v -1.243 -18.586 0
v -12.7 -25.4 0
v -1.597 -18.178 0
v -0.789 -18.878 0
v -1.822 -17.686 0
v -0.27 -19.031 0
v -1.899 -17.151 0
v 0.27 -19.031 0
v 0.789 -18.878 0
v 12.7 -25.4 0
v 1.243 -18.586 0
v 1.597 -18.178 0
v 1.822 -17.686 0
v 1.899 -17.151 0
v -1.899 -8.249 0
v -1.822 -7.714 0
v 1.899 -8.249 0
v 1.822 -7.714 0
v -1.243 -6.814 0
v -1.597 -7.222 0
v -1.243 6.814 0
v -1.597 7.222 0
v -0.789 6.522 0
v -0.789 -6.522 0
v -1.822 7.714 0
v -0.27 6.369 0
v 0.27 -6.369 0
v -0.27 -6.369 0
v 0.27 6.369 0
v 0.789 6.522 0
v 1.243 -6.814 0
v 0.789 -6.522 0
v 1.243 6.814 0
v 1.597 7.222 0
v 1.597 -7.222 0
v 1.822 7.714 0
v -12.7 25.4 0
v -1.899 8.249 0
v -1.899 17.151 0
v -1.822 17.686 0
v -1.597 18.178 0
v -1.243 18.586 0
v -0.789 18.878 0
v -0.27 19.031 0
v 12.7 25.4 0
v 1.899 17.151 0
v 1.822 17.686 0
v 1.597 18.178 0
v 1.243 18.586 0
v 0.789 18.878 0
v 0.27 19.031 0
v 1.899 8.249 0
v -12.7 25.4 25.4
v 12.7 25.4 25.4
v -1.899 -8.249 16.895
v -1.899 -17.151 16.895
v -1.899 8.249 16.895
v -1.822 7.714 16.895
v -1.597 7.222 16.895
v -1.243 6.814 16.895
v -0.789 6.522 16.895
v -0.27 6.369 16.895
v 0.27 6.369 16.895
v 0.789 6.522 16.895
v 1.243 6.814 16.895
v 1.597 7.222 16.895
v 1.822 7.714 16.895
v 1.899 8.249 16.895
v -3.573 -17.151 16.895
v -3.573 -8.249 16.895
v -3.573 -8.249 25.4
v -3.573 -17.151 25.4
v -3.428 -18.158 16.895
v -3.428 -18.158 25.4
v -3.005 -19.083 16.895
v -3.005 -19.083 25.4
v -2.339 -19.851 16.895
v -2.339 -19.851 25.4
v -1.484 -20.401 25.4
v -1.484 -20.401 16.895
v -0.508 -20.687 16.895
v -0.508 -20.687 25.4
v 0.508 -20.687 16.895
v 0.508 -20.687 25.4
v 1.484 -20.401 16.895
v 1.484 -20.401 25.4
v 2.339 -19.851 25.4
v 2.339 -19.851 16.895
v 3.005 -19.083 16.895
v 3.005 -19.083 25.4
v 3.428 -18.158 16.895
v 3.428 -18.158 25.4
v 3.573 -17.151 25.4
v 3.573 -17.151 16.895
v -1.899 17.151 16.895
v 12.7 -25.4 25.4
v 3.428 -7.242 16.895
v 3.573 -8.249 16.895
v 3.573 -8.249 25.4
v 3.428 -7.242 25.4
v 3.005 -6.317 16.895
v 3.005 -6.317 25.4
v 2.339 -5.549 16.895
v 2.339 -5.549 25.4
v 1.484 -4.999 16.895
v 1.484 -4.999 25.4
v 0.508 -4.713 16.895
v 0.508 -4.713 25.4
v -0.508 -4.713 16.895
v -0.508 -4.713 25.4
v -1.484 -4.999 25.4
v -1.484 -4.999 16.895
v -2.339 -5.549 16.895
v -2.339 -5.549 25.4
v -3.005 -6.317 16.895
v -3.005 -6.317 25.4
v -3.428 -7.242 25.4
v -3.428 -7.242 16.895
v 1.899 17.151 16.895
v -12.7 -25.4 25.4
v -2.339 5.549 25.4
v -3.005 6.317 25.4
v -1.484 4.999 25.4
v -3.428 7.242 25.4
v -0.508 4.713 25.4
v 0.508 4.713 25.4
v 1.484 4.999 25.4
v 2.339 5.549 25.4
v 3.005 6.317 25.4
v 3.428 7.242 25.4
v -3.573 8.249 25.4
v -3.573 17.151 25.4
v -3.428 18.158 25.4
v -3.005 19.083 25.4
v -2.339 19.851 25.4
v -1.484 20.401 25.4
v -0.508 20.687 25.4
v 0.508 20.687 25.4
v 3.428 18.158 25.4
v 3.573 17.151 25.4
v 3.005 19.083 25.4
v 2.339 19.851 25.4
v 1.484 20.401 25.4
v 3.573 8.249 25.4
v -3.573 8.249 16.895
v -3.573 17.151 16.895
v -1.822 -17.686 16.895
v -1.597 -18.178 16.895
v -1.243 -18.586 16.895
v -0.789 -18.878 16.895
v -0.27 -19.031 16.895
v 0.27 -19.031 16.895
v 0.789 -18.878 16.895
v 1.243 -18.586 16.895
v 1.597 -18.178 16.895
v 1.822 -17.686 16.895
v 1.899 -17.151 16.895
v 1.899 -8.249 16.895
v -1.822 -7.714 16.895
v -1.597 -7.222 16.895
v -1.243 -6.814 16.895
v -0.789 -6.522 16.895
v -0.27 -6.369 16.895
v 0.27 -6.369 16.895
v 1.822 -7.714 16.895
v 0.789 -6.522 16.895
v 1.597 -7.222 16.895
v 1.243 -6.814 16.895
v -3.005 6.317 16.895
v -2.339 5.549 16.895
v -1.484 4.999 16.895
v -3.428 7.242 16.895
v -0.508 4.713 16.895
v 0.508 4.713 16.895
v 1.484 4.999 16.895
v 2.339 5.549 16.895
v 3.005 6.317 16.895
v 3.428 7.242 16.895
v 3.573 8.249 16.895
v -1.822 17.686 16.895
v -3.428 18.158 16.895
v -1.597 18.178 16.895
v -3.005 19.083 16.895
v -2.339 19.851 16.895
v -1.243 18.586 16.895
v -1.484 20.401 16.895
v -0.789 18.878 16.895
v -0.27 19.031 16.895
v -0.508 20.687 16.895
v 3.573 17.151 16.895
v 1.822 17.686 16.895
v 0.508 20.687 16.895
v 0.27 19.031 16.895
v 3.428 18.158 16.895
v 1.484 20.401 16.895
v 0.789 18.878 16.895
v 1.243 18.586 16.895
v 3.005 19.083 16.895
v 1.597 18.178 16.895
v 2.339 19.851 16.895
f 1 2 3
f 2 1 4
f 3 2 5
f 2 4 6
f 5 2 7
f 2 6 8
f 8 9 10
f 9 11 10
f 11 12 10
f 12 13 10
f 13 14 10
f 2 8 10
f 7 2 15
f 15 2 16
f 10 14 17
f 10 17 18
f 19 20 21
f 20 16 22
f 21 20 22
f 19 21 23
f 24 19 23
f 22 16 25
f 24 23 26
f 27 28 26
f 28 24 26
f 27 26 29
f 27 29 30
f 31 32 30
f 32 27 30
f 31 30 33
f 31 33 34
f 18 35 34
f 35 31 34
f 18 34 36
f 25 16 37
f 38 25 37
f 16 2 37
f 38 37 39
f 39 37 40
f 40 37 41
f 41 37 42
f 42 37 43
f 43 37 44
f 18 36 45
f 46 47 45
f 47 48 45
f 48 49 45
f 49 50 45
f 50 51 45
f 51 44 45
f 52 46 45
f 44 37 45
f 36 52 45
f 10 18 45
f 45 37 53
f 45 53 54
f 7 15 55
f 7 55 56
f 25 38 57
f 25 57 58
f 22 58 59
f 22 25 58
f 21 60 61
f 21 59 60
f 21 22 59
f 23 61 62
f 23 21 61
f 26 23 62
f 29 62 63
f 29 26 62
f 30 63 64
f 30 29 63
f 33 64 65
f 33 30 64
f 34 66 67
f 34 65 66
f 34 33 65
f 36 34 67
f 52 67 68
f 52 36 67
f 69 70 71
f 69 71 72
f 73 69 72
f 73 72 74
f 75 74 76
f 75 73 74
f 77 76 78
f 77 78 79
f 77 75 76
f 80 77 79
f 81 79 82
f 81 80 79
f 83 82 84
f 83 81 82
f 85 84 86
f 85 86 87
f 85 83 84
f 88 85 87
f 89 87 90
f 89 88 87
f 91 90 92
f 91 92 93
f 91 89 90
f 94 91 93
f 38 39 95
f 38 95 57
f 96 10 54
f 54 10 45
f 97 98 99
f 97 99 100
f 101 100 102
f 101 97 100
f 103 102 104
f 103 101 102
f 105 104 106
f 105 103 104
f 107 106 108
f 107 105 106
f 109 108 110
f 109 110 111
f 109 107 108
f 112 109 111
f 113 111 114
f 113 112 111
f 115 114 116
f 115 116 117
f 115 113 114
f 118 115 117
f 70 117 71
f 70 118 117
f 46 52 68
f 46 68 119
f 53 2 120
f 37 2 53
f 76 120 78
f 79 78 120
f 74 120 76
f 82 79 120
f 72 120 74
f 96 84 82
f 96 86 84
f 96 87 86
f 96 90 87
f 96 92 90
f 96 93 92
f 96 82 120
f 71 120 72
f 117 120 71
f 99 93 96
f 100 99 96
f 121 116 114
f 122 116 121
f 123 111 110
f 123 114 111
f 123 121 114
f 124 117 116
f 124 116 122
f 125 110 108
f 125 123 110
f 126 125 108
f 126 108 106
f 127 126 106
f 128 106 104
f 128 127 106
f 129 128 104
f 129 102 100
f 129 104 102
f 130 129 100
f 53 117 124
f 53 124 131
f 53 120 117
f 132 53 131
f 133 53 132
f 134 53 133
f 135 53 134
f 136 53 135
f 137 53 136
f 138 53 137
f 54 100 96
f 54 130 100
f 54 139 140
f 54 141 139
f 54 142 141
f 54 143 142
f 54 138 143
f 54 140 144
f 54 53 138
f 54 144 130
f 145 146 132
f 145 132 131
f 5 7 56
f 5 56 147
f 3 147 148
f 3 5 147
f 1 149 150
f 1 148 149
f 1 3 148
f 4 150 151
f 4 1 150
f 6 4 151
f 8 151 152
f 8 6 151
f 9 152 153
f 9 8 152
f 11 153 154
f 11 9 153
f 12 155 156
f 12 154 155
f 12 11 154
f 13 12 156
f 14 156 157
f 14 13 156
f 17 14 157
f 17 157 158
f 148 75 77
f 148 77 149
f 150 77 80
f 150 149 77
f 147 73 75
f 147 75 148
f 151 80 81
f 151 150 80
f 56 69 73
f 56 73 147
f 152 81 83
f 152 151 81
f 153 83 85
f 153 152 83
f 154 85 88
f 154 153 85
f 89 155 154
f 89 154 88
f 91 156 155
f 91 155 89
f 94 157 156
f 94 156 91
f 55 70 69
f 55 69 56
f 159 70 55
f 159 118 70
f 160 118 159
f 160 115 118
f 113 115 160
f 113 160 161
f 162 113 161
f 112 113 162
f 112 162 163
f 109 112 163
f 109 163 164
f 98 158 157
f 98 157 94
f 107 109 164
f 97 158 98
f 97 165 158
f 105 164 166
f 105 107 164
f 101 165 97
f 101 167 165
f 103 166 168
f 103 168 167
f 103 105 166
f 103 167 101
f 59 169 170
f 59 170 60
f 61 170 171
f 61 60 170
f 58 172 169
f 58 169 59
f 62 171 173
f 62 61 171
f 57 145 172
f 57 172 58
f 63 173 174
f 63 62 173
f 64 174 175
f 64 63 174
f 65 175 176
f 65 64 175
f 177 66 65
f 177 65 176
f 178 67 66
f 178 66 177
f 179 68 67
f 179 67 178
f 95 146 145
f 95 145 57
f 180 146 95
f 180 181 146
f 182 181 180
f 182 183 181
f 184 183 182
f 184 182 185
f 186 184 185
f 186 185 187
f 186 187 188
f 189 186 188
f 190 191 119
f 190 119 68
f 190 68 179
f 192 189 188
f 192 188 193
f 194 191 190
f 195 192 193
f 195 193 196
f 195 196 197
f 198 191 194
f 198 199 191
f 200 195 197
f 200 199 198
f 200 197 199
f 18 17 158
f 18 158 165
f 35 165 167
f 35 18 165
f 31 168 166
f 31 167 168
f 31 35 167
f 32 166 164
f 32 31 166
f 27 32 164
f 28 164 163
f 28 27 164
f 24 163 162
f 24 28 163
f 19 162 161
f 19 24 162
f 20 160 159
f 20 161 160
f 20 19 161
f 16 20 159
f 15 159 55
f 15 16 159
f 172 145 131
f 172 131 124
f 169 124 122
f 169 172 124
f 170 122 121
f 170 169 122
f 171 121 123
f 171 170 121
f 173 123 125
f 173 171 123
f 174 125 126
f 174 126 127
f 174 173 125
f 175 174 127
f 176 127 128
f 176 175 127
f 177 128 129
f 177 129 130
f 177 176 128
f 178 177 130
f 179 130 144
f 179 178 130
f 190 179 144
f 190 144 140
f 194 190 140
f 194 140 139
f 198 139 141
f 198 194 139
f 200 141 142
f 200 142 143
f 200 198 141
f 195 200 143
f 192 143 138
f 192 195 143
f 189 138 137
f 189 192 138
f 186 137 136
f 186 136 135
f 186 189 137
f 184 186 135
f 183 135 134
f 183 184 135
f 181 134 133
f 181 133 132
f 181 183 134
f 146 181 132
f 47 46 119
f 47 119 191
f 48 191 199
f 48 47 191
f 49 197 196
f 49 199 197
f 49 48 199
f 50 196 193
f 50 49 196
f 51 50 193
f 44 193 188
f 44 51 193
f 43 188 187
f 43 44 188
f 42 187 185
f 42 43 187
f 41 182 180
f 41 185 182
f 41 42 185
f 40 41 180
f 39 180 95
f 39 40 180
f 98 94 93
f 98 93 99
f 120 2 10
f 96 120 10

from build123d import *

# Parameters (mm, degrees)
SKETCH1_W                                     = 25.4
SKETCH1_H                                     = 50.8
BOSS_EXTRUDE1_DEPTH                           = 25.4
CBORE_SLOT_FOR_6_SOCKET_HEAD_CAP_SCREW1_DEPTH = 25.4
CBORE_START                                   = 16.89481
CBORE_SLOT_FOR_6_SOCKET_HEAD_CAP_SC_3_DEPTH   = 8.50519


# Read off the part's stored shape, not the designer's step: CBORE SLOT for #6 Socket Head Cap Screw1
with BuildPart() as part:
    # Sketch1 → Boss-Extrude1 (new body)
    with BuildSketch(Plane.XY):
        Rectangle(SKETCH1_W, SKETCH1_H)
    extrude(amount=BOSS_EXTRUDE1_DEPTH)

    # CBORE SLOT for _6 Socket Head Cap Sc 2 → CBORE SLOT for #6 Socket Head Cap Screw1 (cut)
    with BuildSketch(Plane.XY):
        with BuildLine():
            Line((1.89865, -17.15135), (1.89865, -8.24865))
            ThreePointArc((1.89865, -8.24865), (0, -6.35), (-1.89865, -8.24865))
            Line((-1.89865, -8.24865), (-1.89865, -17.15135))
            ThreePointArc((-1.89865, -17.15135), (0, -19.05), (1.89865, -17.15135))
        make_face()
        with BuildLine():
            ThreePointArc((1.89865, 17.15135), (0, 19.05), (-1.89865, 17.15135))
            Line((-1.89865, 17.15135), (-1.89865, 8.24865))
            ThreePointArc((-1.89865, 8.24865), (0, 6.35), (1.89865, 8.24865))
            Line((1.89865, 8.24865), (1.89865, 17.15135))
        make_face()
    extrude(amount=CBORE_SLOT_FOR_6_SOCKET_HEAD_CAP_SCREW1_DEPTH, mode=Mode.SUBTRACT)

    # CBORE SLOT for _6 Socket Head Cap Sc 3 o → CBORE SLOT for _6 Socket Head Cap Sc 3 (cut)
    # profile 1 of 2: a face of its own
    with BuildSketch(Plane.XY.offset(CBORE_START)):
        with BuildLine():
            Line((3.57251, -17.15135), (3.57251, -8.24865))
            ThreePointArc((3.57251, -8.24865), (0, -4.67614), (-3.57251, -8.24865))
            Line((-3.57251, -8.24865), (-3.57251, -17.15135))
            ThreePointArc((-3.57251, -17.15135), (0, -20.72386), (3.57251, -17.15135))
        make_face()
        with BuildLine():
            ThreePointArc((-1.89865, -8.24865), (0, -6.35), (1.89865, -8.24865))
            Line((1.89865, -8.24865), (1.89865, -17.15135))
            ThreePointArc((1.89865, -17.15135), (0, -19.05), (-1.89865, -17.15135))
            Line((-1.89865, -17.15135), (-1.89865, -8.24865))
        make_face(mode=Mode.SUBTRACT)
    # profile 2 of 2: a face of its own
    with BuildSketch(Plane.XY.offset(CBORE_START)):
        with BuildLine():
            ThreePointArc((3.57251, 17.15135), (0, 20.72386), (-3.57251, 17.15135))
            Line((-3.57251, 17.15135), (-3.57251, 8.24865))
            ThreePointArc((-3.57251, 8.24865), (0, 4.67614), (3.57251, 8.24865))
            Line((3.57251, 8.24865), (3.57251, 17.15135))
        make_face()
        with BuildLine():
            Line((-1.89865, 8.24865), (-1.89865, 17.15135))
            ThreePointArc((-1.89865, 17.15135), (0, 19.05), (1.89865, 17.15135))
            Line((1.89865, 17.15135), (1.89865, 8.24865))
            ThreePointArc((1.89865, 8.24865), (0, 6.35), (-1.89865, 8.24865))
        make_face(mode=Mode.SUBTRACT)
    extrude(amount=CBORE_SLOT_FOR_6_SOCKET_HEAD_CAP_SC_3_DEPTH, mode=Mode.SUBTRACT)


solid = part.part
